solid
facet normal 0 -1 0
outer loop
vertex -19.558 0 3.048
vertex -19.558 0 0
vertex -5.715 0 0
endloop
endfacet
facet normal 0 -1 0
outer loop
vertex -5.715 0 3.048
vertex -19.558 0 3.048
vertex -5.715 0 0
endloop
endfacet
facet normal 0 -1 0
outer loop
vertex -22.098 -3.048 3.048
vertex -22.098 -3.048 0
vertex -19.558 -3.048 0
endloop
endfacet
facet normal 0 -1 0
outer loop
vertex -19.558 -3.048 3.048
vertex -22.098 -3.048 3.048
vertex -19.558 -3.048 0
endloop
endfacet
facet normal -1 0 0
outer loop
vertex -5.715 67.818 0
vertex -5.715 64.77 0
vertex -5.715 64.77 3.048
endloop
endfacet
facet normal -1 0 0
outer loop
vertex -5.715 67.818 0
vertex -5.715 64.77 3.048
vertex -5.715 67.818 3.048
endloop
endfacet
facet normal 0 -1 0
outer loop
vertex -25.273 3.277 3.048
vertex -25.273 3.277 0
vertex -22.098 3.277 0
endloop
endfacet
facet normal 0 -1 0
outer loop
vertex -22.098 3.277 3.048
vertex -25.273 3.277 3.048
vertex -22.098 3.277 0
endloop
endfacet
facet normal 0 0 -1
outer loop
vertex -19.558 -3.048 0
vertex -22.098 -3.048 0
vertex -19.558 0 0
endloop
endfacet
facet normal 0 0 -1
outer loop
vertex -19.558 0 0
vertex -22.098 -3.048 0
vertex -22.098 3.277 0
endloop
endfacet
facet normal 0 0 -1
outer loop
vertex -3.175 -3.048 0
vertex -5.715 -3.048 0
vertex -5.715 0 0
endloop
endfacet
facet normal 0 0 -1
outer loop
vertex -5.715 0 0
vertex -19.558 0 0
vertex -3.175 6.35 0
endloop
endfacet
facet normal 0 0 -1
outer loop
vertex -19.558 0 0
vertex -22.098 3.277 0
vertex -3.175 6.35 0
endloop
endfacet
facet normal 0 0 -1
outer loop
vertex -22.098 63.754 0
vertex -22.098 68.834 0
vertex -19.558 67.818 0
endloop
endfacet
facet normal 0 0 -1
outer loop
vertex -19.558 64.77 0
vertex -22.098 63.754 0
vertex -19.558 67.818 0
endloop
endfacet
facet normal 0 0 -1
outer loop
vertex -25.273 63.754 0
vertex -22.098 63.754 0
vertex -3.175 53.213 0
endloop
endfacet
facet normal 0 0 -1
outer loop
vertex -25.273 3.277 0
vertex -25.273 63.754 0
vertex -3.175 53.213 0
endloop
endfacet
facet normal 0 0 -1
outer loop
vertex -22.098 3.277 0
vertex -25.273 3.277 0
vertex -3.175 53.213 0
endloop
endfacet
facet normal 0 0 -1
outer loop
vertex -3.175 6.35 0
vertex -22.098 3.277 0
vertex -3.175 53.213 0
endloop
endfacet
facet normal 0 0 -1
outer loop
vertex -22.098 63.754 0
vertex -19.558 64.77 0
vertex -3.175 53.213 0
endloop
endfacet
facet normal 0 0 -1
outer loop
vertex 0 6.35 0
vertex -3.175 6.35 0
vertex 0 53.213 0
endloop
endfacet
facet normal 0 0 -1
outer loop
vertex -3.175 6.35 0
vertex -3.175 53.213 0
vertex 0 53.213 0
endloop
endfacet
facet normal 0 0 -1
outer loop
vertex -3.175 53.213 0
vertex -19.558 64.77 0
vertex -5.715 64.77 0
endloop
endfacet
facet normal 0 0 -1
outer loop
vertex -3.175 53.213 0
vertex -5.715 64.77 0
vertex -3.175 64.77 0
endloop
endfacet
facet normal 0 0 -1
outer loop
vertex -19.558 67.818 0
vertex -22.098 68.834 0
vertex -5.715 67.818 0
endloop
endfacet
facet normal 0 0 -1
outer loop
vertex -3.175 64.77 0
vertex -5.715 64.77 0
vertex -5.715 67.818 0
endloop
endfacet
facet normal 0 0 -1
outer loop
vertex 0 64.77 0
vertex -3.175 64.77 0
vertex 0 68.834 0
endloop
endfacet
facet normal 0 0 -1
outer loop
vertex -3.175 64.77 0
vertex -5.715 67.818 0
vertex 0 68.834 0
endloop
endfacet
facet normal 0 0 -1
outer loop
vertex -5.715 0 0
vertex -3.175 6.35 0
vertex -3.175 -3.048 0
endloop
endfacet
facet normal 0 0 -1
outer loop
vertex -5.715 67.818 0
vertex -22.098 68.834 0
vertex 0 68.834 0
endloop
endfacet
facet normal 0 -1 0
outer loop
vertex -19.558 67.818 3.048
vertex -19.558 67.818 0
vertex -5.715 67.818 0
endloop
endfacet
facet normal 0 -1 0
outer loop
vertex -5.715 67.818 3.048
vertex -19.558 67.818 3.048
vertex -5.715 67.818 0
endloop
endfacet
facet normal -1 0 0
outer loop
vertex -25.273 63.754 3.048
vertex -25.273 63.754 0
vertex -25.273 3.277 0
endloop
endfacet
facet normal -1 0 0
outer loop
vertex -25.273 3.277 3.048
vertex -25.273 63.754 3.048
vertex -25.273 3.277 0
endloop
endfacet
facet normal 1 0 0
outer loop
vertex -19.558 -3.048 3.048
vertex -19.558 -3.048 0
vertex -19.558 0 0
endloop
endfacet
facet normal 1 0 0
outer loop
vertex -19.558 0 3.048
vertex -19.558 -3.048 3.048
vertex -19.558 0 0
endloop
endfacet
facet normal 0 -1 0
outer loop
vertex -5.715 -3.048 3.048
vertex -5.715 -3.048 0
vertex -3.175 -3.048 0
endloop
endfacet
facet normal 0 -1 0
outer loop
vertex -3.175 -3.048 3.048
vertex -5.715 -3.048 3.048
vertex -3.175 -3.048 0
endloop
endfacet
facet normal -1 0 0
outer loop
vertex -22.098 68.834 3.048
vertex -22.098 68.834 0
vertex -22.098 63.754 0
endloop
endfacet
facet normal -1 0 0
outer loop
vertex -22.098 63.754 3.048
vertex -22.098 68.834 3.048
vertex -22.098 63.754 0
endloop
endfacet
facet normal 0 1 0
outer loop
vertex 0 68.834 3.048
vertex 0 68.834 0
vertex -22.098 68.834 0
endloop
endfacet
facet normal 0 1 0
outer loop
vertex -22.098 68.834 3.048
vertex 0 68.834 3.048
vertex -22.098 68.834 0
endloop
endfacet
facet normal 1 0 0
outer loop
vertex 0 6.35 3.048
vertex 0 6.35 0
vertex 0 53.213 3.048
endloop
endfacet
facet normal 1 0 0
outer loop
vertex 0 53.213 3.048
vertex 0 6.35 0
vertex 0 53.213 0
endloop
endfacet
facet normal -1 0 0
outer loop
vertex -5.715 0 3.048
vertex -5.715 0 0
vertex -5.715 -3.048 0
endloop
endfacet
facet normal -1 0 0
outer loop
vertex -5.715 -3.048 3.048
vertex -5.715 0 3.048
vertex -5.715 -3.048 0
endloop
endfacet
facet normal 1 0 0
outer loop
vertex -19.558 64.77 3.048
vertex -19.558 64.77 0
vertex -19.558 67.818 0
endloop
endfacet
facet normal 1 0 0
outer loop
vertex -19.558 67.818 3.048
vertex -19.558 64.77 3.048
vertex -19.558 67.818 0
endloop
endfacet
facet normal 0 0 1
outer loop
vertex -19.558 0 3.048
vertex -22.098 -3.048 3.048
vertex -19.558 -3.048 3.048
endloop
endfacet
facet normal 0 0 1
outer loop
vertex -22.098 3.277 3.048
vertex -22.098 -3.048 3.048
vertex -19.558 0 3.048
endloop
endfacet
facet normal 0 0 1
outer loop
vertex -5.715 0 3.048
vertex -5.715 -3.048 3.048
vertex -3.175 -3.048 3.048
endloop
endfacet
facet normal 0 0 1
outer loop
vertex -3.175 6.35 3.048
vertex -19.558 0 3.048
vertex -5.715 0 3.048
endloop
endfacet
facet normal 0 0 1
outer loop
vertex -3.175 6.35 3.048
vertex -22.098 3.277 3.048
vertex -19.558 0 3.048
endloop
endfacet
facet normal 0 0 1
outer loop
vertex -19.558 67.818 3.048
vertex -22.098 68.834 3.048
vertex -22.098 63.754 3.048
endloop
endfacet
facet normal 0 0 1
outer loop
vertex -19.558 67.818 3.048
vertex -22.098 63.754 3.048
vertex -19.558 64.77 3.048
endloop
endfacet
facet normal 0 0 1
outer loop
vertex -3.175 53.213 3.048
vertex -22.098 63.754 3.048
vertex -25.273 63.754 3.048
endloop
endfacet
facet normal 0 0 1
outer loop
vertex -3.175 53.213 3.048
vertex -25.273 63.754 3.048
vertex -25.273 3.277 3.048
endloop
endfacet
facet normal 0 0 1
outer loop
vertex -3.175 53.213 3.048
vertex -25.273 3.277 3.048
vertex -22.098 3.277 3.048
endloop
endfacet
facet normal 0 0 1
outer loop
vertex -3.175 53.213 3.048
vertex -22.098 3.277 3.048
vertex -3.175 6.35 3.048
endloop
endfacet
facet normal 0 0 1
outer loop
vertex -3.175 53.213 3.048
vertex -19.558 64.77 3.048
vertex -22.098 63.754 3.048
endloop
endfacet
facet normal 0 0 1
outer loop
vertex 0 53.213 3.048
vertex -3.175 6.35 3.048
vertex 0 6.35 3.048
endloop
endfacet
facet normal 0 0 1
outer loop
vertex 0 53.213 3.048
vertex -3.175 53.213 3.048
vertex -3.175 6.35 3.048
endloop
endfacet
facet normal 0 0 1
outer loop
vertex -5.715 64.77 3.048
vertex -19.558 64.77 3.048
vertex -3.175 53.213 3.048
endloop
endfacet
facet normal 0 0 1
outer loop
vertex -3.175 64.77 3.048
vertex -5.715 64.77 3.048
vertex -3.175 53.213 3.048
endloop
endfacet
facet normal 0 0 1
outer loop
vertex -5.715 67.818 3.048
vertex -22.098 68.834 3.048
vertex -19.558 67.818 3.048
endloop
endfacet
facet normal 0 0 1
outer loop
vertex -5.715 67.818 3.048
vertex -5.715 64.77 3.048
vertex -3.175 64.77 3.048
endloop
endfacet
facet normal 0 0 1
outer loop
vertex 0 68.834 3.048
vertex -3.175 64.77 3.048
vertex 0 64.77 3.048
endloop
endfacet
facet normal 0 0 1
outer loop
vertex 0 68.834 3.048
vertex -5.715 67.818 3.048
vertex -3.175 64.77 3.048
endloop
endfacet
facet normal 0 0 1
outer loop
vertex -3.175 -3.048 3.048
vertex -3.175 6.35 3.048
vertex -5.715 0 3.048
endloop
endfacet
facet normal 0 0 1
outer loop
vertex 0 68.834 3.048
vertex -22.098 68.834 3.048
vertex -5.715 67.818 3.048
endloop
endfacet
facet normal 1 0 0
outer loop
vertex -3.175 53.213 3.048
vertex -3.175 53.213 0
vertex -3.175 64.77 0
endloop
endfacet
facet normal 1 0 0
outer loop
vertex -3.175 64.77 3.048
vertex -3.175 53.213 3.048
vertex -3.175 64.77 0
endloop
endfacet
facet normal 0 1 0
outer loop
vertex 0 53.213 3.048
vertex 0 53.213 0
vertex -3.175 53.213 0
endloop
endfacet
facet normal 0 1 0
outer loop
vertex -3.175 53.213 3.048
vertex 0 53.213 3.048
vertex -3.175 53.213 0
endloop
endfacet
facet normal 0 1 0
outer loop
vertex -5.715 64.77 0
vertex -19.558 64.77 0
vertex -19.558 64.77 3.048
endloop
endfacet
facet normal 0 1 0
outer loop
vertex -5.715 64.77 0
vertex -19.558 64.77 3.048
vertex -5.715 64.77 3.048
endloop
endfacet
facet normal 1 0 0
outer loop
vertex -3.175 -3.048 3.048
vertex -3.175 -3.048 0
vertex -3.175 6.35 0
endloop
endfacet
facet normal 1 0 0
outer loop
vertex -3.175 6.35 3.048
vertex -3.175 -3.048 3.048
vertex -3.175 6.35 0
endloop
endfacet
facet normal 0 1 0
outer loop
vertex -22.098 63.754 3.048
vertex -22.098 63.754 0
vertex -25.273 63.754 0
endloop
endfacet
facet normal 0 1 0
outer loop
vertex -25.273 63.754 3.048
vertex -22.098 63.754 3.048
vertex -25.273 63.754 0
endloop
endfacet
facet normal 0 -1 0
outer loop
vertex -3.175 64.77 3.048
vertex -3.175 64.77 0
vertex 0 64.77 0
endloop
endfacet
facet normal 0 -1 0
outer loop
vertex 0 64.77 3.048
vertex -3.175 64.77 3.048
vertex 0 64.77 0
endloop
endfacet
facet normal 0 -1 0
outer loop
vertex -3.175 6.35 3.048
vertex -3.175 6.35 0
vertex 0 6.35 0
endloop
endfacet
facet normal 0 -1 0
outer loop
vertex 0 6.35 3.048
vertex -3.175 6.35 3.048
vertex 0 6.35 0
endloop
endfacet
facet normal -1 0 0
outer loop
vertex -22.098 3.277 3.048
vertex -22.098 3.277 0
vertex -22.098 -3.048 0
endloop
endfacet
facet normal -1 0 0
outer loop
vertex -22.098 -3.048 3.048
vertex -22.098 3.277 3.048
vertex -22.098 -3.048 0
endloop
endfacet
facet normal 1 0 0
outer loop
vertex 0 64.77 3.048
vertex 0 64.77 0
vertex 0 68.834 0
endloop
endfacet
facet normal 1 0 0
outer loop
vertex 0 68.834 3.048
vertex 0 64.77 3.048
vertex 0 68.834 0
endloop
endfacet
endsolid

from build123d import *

# Parameters (mm, degrees)
SKETCH1_W           = 13.843
SKETCH1_H           = 3.048
SKETCH1_W_2         = 3.175
SKETCH1_H_2         = 0.381
BOSS_EXTRUDE1_DEPTH = 3.048


with BuildPart() as part:
    # Sketch1 → Boss-Extrude1 (new body)
    with BuildSketch(Plane.XY):
        Polygon((-3.175, 6.731), (0, 6.731), (0, 53.213), (-3.175, 53.213), (-3.175, 64.77), (0, 64.77), (0, 68.834), (-22.098, 68.834), (-22.098, 63.754), (-25.273, 63.754), (-25.273, 3.2766), (-22.098, 3.2766), (-22.098, -3.048), (-19.558, -3.048), (-19.558, 0), (-5.715, 0), (-5.715, -3.048), (-3.175, -3.048), (-3.175, 6.35), align=None)
        with Locations((-12.6365, 66.294)):
            Rectangle(SKETCH1_W, SKETCH1_H, mode=Mode.SUBTRACT)
        with Locations((-1.5875, 6.5405)):
            Rectangle(SKETCH1_W_2, SKETCH1_H_2)
    extrude(amount=BOSS_EXTRUDE1_DEPTH)


solid = part.part
